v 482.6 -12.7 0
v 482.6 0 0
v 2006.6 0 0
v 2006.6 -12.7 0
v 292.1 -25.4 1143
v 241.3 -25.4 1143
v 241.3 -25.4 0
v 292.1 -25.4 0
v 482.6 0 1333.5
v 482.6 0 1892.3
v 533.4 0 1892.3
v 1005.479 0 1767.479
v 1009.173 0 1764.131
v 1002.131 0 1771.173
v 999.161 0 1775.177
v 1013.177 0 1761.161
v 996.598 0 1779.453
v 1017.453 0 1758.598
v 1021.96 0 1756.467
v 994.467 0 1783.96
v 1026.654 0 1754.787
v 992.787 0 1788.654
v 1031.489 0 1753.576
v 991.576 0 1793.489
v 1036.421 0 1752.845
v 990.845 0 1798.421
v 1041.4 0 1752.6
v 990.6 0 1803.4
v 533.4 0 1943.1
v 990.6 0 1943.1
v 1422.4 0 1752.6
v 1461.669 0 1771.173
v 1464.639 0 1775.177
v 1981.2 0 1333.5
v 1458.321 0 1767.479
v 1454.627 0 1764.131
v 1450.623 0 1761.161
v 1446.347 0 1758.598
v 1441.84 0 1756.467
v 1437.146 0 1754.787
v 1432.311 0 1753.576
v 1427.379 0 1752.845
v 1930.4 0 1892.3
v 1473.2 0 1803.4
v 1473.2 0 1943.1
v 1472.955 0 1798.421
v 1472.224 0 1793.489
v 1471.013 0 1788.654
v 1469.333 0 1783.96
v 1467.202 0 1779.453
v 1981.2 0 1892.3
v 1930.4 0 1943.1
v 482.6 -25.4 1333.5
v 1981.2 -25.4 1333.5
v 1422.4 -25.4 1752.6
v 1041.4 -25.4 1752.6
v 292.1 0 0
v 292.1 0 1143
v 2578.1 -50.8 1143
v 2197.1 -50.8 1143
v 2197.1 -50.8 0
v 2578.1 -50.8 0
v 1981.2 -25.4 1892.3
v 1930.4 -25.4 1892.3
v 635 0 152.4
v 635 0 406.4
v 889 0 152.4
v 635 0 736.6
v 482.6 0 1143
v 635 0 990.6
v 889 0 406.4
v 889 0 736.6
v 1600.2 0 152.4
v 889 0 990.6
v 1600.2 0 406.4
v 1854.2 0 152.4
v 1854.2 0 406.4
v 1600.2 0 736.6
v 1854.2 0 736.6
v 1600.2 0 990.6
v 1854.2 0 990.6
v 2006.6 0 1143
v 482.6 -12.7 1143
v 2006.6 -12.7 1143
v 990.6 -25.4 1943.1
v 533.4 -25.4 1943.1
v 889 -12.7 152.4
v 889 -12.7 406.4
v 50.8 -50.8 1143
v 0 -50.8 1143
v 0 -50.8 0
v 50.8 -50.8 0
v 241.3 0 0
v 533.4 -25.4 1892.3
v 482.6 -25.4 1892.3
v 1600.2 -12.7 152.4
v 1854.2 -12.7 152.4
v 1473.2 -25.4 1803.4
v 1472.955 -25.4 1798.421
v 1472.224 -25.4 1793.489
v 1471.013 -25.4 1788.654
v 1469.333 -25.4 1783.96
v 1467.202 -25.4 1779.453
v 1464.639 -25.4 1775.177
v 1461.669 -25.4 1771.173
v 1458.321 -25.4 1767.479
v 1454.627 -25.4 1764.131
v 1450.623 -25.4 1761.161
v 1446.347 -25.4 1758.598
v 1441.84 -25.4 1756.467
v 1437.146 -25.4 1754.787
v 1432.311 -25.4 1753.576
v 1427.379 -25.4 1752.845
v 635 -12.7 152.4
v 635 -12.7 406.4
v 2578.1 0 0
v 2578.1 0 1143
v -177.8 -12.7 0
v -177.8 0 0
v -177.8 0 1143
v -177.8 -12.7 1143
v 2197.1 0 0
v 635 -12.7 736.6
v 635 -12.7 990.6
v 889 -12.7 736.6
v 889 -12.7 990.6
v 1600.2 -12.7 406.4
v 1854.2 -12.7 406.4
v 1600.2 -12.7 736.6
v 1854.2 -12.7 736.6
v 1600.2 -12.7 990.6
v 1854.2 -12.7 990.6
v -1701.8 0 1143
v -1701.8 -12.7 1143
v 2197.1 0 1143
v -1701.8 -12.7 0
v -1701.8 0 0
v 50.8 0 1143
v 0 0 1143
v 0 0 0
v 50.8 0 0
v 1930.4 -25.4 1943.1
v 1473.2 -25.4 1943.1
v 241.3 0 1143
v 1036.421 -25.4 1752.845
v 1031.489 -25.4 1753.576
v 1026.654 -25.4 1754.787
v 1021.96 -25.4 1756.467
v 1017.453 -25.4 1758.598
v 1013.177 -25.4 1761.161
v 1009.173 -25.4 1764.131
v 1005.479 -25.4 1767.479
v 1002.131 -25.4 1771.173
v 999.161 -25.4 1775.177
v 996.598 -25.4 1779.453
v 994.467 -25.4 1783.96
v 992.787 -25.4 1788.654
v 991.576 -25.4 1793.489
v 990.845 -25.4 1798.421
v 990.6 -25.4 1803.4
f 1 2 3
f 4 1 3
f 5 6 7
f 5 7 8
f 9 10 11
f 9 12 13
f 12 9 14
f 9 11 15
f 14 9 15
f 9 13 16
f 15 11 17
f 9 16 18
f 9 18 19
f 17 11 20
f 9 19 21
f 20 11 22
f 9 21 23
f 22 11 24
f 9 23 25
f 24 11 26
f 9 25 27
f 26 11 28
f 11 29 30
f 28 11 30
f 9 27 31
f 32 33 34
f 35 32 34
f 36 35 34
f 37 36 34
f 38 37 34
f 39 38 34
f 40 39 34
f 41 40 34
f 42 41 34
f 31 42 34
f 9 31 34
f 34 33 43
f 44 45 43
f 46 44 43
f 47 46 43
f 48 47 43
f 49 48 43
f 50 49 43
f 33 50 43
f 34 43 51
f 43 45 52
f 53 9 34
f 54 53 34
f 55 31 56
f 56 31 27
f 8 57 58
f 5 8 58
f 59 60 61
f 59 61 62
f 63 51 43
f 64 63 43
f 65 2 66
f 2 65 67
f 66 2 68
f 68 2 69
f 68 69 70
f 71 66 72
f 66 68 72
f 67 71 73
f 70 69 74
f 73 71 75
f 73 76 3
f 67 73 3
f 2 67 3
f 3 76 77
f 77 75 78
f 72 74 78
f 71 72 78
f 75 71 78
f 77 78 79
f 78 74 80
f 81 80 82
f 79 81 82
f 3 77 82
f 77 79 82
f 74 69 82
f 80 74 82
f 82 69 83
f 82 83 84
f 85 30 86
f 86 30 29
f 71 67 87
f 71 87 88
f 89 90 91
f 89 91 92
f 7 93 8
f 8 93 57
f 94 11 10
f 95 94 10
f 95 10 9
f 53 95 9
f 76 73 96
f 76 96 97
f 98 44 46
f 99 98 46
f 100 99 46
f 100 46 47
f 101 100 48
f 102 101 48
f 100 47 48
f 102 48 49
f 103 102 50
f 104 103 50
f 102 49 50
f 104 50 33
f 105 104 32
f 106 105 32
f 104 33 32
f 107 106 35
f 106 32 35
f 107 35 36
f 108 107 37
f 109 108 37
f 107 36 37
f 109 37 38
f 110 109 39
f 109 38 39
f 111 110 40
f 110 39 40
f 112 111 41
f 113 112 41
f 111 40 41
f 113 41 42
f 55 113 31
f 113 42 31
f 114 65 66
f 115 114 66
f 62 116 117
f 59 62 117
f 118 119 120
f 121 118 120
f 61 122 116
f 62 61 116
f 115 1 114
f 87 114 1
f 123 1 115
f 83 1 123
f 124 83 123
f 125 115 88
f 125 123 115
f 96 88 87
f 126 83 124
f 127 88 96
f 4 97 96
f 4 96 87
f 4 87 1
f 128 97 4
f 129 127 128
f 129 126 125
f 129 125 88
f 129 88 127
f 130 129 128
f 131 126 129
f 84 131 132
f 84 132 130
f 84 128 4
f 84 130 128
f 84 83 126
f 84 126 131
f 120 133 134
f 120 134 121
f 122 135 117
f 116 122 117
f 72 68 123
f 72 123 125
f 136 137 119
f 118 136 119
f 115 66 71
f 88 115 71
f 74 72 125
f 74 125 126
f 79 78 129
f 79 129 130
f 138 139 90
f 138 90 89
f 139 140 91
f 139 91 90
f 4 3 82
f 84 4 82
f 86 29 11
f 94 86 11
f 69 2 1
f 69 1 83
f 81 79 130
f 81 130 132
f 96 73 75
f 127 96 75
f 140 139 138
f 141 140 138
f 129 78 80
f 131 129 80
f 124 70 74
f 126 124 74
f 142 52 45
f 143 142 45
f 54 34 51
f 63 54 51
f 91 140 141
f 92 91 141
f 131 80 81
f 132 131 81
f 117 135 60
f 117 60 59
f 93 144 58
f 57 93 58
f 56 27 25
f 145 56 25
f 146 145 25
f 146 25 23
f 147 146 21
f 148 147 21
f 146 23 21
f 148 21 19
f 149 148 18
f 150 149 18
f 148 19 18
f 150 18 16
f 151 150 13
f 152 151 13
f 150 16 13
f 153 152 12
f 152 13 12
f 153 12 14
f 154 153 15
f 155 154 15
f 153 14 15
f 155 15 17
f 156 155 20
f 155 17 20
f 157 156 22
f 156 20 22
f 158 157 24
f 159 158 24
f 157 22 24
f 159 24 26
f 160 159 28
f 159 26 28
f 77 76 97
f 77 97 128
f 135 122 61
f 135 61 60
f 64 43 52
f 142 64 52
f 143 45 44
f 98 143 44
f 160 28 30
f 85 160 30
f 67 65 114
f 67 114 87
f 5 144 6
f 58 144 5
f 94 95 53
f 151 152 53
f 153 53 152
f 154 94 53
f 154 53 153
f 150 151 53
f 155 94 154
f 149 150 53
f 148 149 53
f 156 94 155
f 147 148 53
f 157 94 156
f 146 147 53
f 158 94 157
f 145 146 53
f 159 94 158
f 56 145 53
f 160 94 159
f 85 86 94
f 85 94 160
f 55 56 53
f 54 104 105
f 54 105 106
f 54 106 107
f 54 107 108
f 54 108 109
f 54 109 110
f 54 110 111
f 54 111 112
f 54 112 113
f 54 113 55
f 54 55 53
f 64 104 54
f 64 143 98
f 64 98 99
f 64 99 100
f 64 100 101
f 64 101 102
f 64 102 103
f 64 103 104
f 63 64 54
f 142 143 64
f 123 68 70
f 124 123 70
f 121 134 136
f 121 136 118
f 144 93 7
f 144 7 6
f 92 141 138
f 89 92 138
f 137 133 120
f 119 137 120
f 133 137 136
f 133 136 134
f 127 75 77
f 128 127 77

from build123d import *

# Parameters (mm, degrees)
F0_W      = 50.8
F0_H      = 1143
F1_DEPTH  = 50.8
F2_W      = 50.8
F2_H      = 1143
F3_DEPTH  = 25.4
F4_W      = 1524
F4_H      = 1143
F5_DEPTH  = 12.7
F6_W      = 1524
F6_H      = 1143
F6_W_2    = 254
F6_H_2    = 254
F7_DEPTH  = 12.7
F9_DEPTH  = 25.4
F10_W     = 381
F10_H     = 1143
F11_DEPTH = 50.8


with BuildPart() as f1:
    # F0 (on Front) → F1 (new body)
    with BuildSketch(Plane.XZ):
        with Locations((25.4, 571.5)):
            Rectangle(F0_W, F0_H)
    extrude(amount=F1_DEPTH)


with BuildPart() as f3:
    # F2 (on Front) → F3 (new body)
    with BuildSketch(Plane.XZ):
        with Locations((266.7, 571.5)):
            Rectangle(F2_W, F2_H)
    extrude(amount=F3_DEPTH)


with BuildPart() as f5:
    # F4 (on Front) → F5 (new body)
    with BuildSketch(Plane.XZ):
        with Locations((-939.8, 571.5)):
            Rectangle(F4_W, F4_H)
    extrude(amount=F5_DEPTH)


with BuildPart() as f7:
    # F6 (on Front) → F7 (new body)
    with BuildSketch(Plane.XZ):
        with Locations((1244.6, 571.5)):
            Rectangle(F6_W, F6_H)
        with Locations((762, 279.4)):
            Rectangle(F6_W_2, F6_H_2, mode=Mode.SUBTRACT)
        with Locations((1727.2, 279.4)):
            Rectangle(F6_W_2, F6_H_2, mode=Mode.SUBTRACT)
        with Locations((762, 863.6)):
            Rectangle(F6_W_2, F6_H_2, mode=Mode.SUBTRACT)
        with Locations((1727.2, 863.6)):
            Rectangle(F6_W_2, F6_H_2, mode=Mode.SUBTRACT)
    extrude(amount=F7_DEPTH)


with BuildPart() as f9:
    # F8 (on Front) → F9 (new body)
    with BuildSketch(Plane.XZ):
        with BuildLine():
            Line((482.6, 1892.3), (482.6, 1333.5))
            Line((482.6, 1333.5), (1981.2, 1333.5))
            Line((1981.2, 1333.5), (1981.2, 1892.3))
            Line((1981.2, 1892.3), (1930.4, 1892.3))
            Line((1930.4, 1892.3), (1930.4, 1943.1))
            Line((1930.4, 1943.1), (1473.2, 1943.1))
            Line((1473.2, 1943.1), (1473.2, 1803.4))
            ThreePointArc((1473.2, 1803.4), (1458.321024, 1767.478976), (1422.4, 1752.6))
            Line((1422.4, 1752.6), (1041.4, 1752.6))
            ThreePointArc((1041.4, 1752.6), (1005.478976, 1767.478976), (990.6, 1803.4))
            Line((990.6, 1803.4), (990.6, 1943.1))
            Line((990.6, 1943.1), (533.4, 1943.1))
            Line((533.4, 1943.1), (533.4, 1892.3))
            Line((533.4, 1892.3), (482.6, 1892.3))
        make_face()
    extrude(amount=F9_DEPTH)


with BuildPart() as f11:
    # F10 (on Front) → F11 (new body)
    with BuildSketch(Plane.XZ):
        with Locations((2387.6, 571.5)):
            Rectangle(F10_W, F10_H)
    extrude(amount=F11_DEPTH)


solid = Compound([f1.part, f3.part, f5.part, f7.part, f9.part, f11.part])
